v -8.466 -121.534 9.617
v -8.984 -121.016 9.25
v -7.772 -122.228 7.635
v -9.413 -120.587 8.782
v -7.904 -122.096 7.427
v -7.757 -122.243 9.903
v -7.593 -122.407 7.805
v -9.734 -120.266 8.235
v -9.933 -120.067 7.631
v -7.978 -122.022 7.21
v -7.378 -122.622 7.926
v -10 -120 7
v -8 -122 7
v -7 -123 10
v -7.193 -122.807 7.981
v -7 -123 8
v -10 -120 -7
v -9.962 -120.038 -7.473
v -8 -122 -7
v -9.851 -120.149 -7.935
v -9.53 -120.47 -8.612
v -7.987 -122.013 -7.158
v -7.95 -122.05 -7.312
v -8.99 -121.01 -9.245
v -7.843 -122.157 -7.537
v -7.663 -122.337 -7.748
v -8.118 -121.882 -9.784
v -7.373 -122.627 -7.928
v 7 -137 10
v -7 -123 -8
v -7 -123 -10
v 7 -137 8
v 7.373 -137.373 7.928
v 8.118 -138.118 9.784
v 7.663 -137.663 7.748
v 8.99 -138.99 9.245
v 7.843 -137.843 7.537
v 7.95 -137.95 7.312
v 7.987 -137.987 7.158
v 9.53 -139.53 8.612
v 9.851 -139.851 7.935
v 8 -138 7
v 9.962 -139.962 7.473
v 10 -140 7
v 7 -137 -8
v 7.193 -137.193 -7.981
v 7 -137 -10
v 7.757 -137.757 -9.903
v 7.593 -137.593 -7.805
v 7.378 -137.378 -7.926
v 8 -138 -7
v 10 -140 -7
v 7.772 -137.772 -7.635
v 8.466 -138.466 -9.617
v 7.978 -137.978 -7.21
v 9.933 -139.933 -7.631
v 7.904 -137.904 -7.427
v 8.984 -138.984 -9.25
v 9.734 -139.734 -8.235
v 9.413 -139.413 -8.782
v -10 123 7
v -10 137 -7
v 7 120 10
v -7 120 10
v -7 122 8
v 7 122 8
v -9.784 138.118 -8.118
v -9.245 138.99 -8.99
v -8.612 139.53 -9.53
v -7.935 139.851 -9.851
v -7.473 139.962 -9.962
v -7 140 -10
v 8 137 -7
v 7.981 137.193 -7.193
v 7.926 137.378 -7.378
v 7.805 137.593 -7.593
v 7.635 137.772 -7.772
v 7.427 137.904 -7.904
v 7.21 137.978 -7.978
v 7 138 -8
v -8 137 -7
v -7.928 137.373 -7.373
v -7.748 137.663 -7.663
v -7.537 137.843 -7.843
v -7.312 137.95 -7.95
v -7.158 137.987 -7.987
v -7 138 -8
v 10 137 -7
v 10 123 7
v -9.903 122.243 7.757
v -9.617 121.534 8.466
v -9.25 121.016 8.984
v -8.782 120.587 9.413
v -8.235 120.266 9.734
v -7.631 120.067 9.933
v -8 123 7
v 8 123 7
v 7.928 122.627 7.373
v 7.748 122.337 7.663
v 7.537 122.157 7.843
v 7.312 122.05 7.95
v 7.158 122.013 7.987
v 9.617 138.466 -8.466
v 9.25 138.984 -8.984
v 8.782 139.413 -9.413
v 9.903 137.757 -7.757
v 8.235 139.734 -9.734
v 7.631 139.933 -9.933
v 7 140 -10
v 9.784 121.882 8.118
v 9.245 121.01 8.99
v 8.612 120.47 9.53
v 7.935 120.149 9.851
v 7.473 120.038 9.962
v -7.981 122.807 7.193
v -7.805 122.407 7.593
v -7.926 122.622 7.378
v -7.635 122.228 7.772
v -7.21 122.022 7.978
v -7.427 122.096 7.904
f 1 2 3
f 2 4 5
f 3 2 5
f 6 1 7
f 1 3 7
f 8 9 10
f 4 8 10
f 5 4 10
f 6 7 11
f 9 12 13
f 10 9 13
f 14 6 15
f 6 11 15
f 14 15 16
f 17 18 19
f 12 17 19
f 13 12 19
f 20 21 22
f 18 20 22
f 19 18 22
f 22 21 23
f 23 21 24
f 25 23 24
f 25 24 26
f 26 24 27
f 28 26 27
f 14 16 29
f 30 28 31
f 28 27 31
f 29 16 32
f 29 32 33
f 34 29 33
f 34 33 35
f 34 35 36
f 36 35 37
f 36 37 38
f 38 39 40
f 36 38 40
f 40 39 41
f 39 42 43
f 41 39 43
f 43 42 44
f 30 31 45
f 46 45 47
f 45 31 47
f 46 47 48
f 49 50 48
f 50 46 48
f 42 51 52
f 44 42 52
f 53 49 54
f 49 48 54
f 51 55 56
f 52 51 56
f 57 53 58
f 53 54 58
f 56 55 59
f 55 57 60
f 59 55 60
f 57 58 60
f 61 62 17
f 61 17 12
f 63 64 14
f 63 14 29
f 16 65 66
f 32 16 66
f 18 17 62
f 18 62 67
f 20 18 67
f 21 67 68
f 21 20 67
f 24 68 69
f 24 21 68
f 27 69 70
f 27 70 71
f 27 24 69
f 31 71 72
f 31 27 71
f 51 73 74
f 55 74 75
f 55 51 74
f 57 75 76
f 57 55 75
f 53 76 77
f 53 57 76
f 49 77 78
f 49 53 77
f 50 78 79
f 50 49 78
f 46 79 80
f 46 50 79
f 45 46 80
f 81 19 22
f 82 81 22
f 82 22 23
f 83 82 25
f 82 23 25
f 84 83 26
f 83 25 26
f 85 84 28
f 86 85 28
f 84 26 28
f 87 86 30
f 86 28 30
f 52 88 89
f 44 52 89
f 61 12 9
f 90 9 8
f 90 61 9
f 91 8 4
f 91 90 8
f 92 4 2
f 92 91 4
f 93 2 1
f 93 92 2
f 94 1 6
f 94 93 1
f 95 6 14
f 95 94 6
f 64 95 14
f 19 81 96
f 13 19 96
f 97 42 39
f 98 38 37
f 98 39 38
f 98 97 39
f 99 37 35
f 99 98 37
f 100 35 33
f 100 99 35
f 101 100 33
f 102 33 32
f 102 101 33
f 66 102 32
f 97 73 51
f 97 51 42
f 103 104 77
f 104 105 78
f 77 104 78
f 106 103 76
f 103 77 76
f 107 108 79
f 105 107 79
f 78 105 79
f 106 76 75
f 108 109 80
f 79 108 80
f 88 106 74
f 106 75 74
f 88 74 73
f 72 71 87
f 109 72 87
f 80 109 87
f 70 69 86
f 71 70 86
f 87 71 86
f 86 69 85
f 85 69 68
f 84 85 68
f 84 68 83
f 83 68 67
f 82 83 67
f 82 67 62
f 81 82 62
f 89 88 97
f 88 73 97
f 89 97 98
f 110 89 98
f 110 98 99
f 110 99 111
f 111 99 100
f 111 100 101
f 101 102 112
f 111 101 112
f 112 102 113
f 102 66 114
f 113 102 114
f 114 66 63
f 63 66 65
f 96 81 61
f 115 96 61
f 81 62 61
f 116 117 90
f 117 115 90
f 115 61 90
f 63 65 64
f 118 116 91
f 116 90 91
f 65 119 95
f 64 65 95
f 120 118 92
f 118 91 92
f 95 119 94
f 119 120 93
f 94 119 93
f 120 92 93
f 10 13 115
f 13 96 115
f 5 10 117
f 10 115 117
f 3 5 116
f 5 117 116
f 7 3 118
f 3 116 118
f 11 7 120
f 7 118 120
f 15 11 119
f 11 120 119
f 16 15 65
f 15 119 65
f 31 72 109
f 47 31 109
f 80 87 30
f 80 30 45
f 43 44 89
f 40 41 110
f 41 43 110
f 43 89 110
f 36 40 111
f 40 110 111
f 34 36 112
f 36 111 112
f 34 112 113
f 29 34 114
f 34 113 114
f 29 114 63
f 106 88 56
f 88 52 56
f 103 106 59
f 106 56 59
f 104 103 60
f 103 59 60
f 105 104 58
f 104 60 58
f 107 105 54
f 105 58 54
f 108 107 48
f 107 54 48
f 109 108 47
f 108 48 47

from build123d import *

# Parameters (mm, degrees)
F2_W     = 20
F2_H     = 20
F3_DEPTH = 140
F4_R     = 3
F5_T     = -2
F7_DEPTH = 20.001
F9_DEPTH = 25


with BuildPart() as f3:
    # F2 (on Front) → F3 (new body, symmetric)
    with BuildSketch(Plane.XZ):
        Rectangle(F2_W, F2_H)
    extrude(amount=F3_DEPTH, both=True)

    # F4
    f4_edges = [f3.edges().sort_by_distance(p)[0] for p in [
        (10, 0, 10),
        (-10, 0, 10),
        (10, 0, -10),
        (-10, 0, -10),
    ]]
    fillet(f4_edges, radius=F4_R)

    # F5
    f5_openings = [f3.faces().sort_by_distance(p)[0] for p in [
        (0, -140, 0),
        (0, 140, 0),
    ]]
    offset(amount=F5_T, openings=f5_openings)

    # F6 (on face) → F7 (cut, through all)
    with BuildSketch(Plane(origin=(-10, 0, 0), x_dir=(0, -1, 0), z_dir=(-1, 0, 0))):
        Polygon((-120, 10), (-140, 10), (-140, -10), align=None)
    extrude(amount=-F7_DEPTH, mode=Mode.SUBTRACT)

    # F8 (on face) → F9 (cut)
    with BuildSketch(Plane(origin=(0, 0, -10), x_dir=(1, 0, 0), z_dir=(0, 0, -1))):
        Polygon((10, 140), (-10, 140), (-10, 120), align=None)
    extrude(amount=-F9_DEPTH, mode=Mode.SUBTRACT)


solid = f3.part
